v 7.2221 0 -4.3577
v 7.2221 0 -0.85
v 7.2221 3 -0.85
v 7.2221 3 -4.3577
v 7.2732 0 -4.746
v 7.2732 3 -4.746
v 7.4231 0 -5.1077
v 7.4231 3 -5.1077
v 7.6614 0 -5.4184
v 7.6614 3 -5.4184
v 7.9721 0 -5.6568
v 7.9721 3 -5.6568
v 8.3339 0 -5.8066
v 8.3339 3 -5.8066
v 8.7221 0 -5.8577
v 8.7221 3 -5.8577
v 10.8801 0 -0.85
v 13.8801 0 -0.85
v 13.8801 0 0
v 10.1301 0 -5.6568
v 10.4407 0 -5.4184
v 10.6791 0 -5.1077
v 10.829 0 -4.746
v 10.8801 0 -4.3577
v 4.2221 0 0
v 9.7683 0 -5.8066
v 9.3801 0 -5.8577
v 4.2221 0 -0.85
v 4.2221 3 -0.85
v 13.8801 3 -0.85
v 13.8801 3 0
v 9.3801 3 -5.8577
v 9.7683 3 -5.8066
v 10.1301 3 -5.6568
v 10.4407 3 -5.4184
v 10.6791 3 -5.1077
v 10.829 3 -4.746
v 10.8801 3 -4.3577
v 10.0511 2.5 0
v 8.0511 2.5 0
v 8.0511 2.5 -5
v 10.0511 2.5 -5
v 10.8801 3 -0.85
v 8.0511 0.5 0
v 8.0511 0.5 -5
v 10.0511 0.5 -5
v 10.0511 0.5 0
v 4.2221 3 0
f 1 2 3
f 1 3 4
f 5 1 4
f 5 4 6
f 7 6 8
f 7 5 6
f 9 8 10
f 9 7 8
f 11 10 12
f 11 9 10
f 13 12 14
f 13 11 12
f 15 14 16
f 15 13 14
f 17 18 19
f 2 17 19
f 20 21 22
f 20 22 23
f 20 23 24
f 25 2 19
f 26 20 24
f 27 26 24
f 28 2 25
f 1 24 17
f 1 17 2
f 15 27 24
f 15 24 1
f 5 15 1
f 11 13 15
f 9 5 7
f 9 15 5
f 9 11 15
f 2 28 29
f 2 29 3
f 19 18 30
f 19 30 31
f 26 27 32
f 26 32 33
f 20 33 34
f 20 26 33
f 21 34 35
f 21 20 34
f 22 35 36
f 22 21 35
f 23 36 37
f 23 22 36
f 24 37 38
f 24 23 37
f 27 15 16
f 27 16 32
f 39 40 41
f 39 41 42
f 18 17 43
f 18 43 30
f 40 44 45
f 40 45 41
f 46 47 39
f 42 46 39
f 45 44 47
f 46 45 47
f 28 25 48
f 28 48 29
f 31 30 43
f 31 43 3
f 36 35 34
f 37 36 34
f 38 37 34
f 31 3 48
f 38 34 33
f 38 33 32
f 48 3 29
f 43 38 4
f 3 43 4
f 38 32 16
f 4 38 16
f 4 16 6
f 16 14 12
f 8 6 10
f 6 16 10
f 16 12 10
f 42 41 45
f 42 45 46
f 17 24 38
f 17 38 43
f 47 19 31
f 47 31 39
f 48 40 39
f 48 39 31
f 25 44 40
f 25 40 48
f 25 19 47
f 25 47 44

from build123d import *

# Parameters (mm, degrees)
BOSS_EXTRUDE1_DEPTH = 3
SKETCH3_W           = 2
SKETCH3_H           = 2
CUT_EXTRUDE1_DEPTH  = 5


with BuildPart() as part:
    # Sketch1 → Boss-Extrude1 (new body)
    with BuildSketch(Plane(origin=(0, 0, 0), x_dir=(1, 0, 0), z_dir=(0, 1, 0))):
        with BuildLine():
            Line((4.222106341, 0), (4.222106341, 0.85))
            Line((4.222106341, 0.85), (7.222106341, 0.85))
            Line((7.222106341, 0.85), (7.222106341, 4.357735156))
            ThreePointArc((7.222106341, 4.357735156), (7.661446169, 5.418395328), (8.722106341, 5.857735156))
            Line((8.722106341, 5.857735156), (9.380074809, 5.857735156))
            ThreePointArc((9.380074809, 5.857735156), (10.44073498, 5.418395328), (10.880074809, 4.357735156))
            Line((10.880074809, 4.357735156), (10.880074809, 0.85))
            Line((10.880074809, 0.85), (13.880074809, 0.85))
            Line((13.880074809, 0.85), (13.880074809, 0))
            Line((13.880074809, 0), (4.222106341, 0))
        make_face()
    extrude(amount=BOSS_EXTRUDE1_DEPTH)

    # Sketch3 → Cut-Extrude1 (cut)
    with BuildSketch(Plane.XY):
        with Locations((9.051090575, 1.5)):
            Rectangle(SKETCH3_W, SKETCH3_H)
    extrude(amount=-CUT_EXTRUDE1_DEPTH, mode=Mode.SUBTRACT)


solid = part.part
